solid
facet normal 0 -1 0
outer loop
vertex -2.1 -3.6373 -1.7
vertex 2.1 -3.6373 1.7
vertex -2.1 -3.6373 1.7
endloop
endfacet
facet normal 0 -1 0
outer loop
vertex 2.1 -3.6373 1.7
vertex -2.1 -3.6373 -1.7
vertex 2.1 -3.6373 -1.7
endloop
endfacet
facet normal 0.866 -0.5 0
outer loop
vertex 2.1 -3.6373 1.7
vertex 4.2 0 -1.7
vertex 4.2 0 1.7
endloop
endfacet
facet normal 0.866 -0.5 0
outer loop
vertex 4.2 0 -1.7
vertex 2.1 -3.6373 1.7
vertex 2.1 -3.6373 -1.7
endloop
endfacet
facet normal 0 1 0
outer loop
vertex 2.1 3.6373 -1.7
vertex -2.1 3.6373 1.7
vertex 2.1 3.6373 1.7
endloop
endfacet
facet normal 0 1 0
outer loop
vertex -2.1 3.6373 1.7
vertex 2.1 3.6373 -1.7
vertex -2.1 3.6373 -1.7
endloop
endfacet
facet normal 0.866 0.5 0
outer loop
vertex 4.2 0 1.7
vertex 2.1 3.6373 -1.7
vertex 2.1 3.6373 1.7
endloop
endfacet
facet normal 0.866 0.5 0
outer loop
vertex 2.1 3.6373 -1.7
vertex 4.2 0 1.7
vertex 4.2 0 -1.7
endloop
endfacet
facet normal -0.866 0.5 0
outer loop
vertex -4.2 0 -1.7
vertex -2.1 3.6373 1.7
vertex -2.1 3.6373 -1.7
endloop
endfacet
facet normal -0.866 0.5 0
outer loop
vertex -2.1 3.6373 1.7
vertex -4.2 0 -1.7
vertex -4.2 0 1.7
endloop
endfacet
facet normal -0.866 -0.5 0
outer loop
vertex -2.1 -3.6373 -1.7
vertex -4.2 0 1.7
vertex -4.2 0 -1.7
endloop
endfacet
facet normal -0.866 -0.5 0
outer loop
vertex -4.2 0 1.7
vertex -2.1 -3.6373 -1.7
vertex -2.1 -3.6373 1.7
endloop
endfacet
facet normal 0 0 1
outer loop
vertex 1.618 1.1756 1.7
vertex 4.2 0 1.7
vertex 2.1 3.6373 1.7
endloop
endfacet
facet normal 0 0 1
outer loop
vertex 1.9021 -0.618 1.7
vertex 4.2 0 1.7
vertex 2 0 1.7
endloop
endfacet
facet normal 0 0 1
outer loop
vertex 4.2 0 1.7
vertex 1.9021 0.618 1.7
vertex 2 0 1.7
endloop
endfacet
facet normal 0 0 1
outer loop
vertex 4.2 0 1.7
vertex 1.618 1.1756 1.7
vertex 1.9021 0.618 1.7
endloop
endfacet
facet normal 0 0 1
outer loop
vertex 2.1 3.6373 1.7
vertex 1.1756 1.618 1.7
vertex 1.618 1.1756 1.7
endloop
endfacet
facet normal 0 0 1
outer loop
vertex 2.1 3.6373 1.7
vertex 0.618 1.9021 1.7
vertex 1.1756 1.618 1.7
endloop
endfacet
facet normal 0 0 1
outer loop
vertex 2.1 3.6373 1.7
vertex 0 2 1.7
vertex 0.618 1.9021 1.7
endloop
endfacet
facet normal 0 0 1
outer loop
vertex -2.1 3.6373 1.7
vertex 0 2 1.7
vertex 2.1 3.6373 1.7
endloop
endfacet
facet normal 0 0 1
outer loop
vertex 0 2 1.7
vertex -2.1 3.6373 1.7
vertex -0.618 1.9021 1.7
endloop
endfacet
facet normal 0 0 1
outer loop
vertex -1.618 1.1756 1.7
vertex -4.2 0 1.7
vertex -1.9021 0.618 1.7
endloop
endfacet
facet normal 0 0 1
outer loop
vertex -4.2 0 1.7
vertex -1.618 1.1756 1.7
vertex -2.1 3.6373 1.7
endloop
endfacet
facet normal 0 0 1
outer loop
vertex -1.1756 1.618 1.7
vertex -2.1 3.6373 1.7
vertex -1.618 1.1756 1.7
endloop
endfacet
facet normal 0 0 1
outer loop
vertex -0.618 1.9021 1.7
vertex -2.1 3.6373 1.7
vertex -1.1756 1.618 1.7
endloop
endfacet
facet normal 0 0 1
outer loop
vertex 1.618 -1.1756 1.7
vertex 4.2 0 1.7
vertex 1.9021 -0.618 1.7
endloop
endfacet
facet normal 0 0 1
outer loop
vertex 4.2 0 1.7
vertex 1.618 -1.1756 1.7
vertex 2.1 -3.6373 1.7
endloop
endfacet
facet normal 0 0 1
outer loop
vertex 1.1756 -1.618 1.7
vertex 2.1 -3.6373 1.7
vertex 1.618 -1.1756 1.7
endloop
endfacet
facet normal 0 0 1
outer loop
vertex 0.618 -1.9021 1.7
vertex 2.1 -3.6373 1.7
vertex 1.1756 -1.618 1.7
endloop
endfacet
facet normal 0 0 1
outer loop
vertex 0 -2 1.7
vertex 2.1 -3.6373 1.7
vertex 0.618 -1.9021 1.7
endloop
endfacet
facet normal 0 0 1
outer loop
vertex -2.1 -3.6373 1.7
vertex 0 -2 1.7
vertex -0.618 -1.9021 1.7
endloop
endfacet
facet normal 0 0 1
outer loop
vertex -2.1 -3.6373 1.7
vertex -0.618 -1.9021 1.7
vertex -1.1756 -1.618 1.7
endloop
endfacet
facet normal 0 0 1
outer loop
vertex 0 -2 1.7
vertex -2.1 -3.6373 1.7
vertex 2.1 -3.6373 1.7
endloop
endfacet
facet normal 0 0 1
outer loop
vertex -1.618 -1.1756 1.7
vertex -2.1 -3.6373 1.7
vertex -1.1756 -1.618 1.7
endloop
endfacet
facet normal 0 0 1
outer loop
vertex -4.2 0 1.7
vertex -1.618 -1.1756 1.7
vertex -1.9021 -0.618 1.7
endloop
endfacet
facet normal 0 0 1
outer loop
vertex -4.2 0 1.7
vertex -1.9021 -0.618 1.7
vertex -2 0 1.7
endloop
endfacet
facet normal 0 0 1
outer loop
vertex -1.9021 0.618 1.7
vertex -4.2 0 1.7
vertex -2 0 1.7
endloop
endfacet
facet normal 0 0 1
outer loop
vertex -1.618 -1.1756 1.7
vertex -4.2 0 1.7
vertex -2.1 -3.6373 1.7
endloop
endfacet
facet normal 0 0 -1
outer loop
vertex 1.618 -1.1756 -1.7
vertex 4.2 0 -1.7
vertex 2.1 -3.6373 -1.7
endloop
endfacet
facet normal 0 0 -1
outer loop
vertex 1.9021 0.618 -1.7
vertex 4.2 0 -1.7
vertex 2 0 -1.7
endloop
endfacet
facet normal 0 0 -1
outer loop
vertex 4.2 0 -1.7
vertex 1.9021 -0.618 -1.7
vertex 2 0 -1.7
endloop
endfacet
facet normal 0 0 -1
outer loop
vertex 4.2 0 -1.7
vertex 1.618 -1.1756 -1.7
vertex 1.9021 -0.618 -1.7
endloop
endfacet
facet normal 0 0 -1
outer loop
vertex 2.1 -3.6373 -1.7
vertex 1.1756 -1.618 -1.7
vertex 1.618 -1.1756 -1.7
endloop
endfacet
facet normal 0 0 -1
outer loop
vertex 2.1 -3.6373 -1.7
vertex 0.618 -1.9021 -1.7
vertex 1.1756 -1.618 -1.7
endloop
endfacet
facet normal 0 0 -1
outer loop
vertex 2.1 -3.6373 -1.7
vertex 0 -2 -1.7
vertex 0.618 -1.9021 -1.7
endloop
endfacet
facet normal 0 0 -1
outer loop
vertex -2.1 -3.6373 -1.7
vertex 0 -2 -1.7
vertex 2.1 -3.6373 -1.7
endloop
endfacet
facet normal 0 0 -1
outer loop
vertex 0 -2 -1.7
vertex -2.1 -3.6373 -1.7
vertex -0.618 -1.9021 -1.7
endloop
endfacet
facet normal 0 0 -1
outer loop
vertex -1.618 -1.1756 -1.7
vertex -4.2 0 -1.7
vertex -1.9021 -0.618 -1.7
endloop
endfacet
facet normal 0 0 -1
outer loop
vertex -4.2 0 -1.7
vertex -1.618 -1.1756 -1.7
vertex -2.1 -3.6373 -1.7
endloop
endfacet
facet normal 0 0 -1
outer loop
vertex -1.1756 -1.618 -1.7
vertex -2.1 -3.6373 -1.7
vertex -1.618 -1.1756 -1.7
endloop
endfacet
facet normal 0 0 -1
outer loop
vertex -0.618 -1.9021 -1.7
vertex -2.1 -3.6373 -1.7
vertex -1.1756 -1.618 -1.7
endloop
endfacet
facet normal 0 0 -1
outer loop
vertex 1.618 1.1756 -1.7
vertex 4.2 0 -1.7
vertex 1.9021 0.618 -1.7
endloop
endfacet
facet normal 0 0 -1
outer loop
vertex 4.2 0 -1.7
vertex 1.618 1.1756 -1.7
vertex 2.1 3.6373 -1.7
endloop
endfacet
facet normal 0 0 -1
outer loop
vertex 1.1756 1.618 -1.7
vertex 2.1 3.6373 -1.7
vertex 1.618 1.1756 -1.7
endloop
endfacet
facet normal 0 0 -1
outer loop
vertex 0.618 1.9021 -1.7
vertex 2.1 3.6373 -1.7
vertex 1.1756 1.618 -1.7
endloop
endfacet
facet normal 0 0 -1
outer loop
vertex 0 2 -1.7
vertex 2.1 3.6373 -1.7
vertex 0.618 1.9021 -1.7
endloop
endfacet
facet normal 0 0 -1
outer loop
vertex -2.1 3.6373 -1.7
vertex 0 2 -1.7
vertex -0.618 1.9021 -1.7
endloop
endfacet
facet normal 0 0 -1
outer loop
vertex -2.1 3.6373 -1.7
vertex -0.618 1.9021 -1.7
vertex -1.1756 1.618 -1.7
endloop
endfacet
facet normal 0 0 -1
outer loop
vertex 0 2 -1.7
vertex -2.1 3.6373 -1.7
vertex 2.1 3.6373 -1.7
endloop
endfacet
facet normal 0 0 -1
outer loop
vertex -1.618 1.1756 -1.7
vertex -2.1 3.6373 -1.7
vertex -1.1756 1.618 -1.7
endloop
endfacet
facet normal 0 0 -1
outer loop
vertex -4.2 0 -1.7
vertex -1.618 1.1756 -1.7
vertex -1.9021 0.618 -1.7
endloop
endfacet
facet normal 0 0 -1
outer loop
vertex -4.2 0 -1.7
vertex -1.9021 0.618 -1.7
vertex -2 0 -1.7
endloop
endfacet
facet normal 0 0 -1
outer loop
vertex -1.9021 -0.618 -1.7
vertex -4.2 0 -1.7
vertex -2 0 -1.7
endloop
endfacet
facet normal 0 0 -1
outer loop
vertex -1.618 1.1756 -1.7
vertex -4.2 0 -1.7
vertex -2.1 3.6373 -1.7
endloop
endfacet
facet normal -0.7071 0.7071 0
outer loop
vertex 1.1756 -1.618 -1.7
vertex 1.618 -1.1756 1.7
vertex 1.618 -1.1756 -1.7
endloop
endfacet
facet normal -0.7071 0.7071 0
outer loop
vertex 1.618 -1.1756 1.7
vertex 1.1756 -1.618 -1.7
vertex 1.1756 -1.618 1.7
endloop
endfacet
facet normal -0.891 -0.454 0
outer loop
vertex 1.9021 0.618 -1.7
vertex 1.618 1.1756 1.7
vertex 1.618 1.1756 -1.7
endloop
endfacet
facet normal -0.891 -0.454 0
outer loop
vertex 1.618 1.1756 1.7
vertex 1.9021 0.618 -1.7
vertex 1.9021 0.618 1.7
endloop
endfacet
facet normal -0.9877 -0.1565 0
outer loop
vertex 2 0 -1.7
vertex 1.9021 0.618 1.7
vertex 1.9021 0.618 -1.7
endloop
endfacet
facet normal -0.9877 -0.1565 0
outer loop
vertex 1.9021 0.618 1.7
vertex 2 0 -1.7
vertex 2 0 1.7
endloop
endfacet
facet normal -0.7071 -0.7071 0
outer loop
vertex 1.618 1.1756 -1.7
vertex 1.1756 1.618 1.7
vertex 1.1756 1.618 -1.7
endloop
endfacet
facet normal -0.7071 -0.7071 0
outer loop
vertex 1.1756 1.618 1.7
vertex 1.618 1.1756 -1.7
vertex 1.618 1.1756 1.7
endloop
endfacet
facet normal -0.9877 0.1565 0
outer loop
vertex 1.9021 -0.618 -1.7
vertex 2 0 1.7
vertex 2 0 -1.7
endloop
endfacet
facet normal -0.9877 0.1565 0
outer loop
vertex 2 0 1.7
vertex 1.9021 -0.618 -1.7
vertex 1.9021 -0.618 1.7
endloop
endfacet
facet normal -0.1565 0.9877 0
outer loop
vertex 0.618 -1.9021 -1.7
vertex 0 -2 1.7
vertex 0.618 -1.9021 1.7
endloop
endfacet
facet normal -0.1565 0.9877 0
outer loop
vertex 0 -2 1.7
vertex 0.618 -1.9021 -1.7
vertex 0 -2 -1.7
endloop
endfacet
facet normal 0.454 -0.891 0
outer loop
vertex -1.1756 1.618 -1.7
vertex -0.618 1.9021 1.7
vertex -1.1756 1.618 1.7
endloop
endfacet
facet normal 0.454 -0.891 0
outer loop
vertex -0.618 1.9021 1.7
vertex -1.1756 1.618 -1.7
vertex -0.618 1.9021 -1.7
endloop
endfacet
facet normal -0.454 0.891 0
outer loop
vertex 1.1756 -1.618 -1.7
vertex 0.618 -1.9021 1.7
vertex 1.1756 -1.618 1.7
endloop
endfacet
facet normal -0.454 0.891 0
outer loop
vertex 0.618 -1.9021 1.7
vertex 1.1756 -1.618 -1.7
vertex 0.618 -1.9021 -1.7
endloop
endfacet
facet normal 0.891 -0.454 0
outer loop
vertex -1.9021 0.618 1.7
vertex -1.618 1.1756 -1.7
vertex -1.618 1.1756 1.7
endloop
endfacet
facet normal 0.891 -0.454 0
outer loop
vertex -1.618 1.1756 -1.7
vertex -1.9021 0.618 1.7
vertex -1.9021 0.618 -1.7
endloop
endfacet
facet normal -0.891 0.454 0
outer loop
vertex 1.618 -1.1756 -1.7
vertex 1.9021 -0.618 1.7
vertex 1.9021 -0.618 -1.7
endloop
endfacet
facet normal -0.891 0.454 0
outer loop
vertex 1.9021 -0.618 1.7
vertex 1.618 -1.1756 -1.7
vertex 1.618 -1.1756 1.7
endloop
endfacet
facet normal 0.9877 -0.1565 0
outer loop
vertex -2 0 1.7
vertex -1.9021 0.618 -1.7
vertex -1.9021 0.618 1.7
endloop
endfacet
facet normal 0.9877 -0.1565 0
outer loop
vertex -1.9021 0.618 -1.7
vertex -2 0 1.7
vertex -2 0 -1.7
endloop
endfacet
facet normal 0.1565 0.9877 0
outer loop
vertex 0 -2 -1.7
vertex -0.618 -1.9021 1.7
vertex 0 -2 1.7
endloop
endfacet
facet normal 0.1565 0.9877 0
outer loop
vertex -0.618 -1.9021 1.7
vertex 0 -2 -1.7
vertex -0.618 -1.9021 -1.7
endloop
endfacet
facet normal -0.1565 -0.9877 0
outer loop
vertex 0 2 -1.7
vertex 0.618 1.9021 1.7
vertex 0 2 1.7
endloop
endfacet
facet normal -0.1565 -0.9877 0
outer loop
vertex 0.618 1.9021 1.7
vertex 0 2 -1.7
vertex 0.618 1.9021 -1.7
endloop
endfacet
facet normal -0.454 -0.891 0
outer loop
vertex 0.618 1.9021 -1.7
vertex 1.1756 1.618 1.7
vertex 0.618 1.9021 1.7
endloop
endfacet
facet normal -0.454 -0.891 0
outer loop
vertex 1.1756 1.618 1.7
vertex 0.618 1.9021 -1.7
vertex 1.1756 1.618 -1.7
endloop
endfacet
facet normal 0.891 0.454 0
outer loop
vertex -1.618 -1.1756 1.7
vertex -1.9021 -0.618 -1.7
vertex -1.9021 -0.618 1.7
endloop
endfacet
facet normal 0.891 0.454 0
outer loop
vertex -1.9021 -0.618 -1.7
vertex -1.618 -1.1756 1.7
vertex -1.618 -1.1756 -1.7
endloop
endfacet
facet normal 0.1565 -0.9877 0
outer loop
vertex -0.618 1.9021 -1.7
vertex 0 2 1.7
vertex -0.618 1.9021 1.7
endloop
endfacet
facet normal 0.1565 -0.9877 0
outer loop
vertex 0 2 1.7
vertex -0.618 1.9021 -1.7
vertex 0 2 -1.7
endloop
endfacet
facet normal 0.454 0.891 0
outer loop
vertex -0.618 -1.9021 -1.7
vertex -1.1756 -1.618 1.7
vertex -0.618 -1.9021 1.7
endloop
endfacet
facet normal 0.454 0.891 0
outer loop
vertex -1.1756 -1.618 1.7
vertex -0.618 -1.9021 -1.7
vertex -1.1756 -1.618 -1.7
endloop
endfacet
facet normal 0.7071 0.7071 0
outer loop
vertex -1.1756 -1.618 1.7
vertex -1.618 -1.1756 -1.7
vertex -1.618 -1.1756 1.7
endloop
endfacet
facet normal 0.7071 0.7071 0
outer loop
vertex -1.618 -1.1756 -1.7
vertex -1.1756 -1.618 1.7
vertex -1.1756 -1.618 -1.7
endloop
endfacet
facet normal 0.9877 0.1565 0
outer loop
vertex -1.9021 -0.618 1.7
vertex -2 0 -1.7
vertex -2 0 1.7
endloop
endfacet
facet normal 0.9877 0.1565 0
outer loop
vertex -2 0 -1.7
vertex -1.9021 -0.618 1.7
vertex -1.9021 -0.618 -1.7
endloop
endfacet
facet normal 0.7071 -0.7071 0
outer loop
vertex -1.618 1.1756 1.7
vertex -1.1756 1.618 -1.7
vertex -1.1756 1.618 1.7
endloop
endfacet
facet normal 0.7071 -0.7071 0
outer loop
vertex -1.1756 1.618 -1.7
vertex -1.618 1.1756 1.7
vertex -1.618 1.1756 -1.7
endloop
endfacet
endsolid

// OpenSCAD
/* Nut M3
  nut_h = 2.5;
  nut_radius = 6.4/2;
  nut_drill = 3.1;
*/

//-- Nut M4
  nut_h = 3.4;
  nut_radius = 8.4/2;
  nut_drill = 4;

difference() {
  cylinder(r=nut_radius, h = nut_h, $fn=6,center=true);
  cylinder(r=nut_drill/2, h=10,center=true, $fn=20);
}
